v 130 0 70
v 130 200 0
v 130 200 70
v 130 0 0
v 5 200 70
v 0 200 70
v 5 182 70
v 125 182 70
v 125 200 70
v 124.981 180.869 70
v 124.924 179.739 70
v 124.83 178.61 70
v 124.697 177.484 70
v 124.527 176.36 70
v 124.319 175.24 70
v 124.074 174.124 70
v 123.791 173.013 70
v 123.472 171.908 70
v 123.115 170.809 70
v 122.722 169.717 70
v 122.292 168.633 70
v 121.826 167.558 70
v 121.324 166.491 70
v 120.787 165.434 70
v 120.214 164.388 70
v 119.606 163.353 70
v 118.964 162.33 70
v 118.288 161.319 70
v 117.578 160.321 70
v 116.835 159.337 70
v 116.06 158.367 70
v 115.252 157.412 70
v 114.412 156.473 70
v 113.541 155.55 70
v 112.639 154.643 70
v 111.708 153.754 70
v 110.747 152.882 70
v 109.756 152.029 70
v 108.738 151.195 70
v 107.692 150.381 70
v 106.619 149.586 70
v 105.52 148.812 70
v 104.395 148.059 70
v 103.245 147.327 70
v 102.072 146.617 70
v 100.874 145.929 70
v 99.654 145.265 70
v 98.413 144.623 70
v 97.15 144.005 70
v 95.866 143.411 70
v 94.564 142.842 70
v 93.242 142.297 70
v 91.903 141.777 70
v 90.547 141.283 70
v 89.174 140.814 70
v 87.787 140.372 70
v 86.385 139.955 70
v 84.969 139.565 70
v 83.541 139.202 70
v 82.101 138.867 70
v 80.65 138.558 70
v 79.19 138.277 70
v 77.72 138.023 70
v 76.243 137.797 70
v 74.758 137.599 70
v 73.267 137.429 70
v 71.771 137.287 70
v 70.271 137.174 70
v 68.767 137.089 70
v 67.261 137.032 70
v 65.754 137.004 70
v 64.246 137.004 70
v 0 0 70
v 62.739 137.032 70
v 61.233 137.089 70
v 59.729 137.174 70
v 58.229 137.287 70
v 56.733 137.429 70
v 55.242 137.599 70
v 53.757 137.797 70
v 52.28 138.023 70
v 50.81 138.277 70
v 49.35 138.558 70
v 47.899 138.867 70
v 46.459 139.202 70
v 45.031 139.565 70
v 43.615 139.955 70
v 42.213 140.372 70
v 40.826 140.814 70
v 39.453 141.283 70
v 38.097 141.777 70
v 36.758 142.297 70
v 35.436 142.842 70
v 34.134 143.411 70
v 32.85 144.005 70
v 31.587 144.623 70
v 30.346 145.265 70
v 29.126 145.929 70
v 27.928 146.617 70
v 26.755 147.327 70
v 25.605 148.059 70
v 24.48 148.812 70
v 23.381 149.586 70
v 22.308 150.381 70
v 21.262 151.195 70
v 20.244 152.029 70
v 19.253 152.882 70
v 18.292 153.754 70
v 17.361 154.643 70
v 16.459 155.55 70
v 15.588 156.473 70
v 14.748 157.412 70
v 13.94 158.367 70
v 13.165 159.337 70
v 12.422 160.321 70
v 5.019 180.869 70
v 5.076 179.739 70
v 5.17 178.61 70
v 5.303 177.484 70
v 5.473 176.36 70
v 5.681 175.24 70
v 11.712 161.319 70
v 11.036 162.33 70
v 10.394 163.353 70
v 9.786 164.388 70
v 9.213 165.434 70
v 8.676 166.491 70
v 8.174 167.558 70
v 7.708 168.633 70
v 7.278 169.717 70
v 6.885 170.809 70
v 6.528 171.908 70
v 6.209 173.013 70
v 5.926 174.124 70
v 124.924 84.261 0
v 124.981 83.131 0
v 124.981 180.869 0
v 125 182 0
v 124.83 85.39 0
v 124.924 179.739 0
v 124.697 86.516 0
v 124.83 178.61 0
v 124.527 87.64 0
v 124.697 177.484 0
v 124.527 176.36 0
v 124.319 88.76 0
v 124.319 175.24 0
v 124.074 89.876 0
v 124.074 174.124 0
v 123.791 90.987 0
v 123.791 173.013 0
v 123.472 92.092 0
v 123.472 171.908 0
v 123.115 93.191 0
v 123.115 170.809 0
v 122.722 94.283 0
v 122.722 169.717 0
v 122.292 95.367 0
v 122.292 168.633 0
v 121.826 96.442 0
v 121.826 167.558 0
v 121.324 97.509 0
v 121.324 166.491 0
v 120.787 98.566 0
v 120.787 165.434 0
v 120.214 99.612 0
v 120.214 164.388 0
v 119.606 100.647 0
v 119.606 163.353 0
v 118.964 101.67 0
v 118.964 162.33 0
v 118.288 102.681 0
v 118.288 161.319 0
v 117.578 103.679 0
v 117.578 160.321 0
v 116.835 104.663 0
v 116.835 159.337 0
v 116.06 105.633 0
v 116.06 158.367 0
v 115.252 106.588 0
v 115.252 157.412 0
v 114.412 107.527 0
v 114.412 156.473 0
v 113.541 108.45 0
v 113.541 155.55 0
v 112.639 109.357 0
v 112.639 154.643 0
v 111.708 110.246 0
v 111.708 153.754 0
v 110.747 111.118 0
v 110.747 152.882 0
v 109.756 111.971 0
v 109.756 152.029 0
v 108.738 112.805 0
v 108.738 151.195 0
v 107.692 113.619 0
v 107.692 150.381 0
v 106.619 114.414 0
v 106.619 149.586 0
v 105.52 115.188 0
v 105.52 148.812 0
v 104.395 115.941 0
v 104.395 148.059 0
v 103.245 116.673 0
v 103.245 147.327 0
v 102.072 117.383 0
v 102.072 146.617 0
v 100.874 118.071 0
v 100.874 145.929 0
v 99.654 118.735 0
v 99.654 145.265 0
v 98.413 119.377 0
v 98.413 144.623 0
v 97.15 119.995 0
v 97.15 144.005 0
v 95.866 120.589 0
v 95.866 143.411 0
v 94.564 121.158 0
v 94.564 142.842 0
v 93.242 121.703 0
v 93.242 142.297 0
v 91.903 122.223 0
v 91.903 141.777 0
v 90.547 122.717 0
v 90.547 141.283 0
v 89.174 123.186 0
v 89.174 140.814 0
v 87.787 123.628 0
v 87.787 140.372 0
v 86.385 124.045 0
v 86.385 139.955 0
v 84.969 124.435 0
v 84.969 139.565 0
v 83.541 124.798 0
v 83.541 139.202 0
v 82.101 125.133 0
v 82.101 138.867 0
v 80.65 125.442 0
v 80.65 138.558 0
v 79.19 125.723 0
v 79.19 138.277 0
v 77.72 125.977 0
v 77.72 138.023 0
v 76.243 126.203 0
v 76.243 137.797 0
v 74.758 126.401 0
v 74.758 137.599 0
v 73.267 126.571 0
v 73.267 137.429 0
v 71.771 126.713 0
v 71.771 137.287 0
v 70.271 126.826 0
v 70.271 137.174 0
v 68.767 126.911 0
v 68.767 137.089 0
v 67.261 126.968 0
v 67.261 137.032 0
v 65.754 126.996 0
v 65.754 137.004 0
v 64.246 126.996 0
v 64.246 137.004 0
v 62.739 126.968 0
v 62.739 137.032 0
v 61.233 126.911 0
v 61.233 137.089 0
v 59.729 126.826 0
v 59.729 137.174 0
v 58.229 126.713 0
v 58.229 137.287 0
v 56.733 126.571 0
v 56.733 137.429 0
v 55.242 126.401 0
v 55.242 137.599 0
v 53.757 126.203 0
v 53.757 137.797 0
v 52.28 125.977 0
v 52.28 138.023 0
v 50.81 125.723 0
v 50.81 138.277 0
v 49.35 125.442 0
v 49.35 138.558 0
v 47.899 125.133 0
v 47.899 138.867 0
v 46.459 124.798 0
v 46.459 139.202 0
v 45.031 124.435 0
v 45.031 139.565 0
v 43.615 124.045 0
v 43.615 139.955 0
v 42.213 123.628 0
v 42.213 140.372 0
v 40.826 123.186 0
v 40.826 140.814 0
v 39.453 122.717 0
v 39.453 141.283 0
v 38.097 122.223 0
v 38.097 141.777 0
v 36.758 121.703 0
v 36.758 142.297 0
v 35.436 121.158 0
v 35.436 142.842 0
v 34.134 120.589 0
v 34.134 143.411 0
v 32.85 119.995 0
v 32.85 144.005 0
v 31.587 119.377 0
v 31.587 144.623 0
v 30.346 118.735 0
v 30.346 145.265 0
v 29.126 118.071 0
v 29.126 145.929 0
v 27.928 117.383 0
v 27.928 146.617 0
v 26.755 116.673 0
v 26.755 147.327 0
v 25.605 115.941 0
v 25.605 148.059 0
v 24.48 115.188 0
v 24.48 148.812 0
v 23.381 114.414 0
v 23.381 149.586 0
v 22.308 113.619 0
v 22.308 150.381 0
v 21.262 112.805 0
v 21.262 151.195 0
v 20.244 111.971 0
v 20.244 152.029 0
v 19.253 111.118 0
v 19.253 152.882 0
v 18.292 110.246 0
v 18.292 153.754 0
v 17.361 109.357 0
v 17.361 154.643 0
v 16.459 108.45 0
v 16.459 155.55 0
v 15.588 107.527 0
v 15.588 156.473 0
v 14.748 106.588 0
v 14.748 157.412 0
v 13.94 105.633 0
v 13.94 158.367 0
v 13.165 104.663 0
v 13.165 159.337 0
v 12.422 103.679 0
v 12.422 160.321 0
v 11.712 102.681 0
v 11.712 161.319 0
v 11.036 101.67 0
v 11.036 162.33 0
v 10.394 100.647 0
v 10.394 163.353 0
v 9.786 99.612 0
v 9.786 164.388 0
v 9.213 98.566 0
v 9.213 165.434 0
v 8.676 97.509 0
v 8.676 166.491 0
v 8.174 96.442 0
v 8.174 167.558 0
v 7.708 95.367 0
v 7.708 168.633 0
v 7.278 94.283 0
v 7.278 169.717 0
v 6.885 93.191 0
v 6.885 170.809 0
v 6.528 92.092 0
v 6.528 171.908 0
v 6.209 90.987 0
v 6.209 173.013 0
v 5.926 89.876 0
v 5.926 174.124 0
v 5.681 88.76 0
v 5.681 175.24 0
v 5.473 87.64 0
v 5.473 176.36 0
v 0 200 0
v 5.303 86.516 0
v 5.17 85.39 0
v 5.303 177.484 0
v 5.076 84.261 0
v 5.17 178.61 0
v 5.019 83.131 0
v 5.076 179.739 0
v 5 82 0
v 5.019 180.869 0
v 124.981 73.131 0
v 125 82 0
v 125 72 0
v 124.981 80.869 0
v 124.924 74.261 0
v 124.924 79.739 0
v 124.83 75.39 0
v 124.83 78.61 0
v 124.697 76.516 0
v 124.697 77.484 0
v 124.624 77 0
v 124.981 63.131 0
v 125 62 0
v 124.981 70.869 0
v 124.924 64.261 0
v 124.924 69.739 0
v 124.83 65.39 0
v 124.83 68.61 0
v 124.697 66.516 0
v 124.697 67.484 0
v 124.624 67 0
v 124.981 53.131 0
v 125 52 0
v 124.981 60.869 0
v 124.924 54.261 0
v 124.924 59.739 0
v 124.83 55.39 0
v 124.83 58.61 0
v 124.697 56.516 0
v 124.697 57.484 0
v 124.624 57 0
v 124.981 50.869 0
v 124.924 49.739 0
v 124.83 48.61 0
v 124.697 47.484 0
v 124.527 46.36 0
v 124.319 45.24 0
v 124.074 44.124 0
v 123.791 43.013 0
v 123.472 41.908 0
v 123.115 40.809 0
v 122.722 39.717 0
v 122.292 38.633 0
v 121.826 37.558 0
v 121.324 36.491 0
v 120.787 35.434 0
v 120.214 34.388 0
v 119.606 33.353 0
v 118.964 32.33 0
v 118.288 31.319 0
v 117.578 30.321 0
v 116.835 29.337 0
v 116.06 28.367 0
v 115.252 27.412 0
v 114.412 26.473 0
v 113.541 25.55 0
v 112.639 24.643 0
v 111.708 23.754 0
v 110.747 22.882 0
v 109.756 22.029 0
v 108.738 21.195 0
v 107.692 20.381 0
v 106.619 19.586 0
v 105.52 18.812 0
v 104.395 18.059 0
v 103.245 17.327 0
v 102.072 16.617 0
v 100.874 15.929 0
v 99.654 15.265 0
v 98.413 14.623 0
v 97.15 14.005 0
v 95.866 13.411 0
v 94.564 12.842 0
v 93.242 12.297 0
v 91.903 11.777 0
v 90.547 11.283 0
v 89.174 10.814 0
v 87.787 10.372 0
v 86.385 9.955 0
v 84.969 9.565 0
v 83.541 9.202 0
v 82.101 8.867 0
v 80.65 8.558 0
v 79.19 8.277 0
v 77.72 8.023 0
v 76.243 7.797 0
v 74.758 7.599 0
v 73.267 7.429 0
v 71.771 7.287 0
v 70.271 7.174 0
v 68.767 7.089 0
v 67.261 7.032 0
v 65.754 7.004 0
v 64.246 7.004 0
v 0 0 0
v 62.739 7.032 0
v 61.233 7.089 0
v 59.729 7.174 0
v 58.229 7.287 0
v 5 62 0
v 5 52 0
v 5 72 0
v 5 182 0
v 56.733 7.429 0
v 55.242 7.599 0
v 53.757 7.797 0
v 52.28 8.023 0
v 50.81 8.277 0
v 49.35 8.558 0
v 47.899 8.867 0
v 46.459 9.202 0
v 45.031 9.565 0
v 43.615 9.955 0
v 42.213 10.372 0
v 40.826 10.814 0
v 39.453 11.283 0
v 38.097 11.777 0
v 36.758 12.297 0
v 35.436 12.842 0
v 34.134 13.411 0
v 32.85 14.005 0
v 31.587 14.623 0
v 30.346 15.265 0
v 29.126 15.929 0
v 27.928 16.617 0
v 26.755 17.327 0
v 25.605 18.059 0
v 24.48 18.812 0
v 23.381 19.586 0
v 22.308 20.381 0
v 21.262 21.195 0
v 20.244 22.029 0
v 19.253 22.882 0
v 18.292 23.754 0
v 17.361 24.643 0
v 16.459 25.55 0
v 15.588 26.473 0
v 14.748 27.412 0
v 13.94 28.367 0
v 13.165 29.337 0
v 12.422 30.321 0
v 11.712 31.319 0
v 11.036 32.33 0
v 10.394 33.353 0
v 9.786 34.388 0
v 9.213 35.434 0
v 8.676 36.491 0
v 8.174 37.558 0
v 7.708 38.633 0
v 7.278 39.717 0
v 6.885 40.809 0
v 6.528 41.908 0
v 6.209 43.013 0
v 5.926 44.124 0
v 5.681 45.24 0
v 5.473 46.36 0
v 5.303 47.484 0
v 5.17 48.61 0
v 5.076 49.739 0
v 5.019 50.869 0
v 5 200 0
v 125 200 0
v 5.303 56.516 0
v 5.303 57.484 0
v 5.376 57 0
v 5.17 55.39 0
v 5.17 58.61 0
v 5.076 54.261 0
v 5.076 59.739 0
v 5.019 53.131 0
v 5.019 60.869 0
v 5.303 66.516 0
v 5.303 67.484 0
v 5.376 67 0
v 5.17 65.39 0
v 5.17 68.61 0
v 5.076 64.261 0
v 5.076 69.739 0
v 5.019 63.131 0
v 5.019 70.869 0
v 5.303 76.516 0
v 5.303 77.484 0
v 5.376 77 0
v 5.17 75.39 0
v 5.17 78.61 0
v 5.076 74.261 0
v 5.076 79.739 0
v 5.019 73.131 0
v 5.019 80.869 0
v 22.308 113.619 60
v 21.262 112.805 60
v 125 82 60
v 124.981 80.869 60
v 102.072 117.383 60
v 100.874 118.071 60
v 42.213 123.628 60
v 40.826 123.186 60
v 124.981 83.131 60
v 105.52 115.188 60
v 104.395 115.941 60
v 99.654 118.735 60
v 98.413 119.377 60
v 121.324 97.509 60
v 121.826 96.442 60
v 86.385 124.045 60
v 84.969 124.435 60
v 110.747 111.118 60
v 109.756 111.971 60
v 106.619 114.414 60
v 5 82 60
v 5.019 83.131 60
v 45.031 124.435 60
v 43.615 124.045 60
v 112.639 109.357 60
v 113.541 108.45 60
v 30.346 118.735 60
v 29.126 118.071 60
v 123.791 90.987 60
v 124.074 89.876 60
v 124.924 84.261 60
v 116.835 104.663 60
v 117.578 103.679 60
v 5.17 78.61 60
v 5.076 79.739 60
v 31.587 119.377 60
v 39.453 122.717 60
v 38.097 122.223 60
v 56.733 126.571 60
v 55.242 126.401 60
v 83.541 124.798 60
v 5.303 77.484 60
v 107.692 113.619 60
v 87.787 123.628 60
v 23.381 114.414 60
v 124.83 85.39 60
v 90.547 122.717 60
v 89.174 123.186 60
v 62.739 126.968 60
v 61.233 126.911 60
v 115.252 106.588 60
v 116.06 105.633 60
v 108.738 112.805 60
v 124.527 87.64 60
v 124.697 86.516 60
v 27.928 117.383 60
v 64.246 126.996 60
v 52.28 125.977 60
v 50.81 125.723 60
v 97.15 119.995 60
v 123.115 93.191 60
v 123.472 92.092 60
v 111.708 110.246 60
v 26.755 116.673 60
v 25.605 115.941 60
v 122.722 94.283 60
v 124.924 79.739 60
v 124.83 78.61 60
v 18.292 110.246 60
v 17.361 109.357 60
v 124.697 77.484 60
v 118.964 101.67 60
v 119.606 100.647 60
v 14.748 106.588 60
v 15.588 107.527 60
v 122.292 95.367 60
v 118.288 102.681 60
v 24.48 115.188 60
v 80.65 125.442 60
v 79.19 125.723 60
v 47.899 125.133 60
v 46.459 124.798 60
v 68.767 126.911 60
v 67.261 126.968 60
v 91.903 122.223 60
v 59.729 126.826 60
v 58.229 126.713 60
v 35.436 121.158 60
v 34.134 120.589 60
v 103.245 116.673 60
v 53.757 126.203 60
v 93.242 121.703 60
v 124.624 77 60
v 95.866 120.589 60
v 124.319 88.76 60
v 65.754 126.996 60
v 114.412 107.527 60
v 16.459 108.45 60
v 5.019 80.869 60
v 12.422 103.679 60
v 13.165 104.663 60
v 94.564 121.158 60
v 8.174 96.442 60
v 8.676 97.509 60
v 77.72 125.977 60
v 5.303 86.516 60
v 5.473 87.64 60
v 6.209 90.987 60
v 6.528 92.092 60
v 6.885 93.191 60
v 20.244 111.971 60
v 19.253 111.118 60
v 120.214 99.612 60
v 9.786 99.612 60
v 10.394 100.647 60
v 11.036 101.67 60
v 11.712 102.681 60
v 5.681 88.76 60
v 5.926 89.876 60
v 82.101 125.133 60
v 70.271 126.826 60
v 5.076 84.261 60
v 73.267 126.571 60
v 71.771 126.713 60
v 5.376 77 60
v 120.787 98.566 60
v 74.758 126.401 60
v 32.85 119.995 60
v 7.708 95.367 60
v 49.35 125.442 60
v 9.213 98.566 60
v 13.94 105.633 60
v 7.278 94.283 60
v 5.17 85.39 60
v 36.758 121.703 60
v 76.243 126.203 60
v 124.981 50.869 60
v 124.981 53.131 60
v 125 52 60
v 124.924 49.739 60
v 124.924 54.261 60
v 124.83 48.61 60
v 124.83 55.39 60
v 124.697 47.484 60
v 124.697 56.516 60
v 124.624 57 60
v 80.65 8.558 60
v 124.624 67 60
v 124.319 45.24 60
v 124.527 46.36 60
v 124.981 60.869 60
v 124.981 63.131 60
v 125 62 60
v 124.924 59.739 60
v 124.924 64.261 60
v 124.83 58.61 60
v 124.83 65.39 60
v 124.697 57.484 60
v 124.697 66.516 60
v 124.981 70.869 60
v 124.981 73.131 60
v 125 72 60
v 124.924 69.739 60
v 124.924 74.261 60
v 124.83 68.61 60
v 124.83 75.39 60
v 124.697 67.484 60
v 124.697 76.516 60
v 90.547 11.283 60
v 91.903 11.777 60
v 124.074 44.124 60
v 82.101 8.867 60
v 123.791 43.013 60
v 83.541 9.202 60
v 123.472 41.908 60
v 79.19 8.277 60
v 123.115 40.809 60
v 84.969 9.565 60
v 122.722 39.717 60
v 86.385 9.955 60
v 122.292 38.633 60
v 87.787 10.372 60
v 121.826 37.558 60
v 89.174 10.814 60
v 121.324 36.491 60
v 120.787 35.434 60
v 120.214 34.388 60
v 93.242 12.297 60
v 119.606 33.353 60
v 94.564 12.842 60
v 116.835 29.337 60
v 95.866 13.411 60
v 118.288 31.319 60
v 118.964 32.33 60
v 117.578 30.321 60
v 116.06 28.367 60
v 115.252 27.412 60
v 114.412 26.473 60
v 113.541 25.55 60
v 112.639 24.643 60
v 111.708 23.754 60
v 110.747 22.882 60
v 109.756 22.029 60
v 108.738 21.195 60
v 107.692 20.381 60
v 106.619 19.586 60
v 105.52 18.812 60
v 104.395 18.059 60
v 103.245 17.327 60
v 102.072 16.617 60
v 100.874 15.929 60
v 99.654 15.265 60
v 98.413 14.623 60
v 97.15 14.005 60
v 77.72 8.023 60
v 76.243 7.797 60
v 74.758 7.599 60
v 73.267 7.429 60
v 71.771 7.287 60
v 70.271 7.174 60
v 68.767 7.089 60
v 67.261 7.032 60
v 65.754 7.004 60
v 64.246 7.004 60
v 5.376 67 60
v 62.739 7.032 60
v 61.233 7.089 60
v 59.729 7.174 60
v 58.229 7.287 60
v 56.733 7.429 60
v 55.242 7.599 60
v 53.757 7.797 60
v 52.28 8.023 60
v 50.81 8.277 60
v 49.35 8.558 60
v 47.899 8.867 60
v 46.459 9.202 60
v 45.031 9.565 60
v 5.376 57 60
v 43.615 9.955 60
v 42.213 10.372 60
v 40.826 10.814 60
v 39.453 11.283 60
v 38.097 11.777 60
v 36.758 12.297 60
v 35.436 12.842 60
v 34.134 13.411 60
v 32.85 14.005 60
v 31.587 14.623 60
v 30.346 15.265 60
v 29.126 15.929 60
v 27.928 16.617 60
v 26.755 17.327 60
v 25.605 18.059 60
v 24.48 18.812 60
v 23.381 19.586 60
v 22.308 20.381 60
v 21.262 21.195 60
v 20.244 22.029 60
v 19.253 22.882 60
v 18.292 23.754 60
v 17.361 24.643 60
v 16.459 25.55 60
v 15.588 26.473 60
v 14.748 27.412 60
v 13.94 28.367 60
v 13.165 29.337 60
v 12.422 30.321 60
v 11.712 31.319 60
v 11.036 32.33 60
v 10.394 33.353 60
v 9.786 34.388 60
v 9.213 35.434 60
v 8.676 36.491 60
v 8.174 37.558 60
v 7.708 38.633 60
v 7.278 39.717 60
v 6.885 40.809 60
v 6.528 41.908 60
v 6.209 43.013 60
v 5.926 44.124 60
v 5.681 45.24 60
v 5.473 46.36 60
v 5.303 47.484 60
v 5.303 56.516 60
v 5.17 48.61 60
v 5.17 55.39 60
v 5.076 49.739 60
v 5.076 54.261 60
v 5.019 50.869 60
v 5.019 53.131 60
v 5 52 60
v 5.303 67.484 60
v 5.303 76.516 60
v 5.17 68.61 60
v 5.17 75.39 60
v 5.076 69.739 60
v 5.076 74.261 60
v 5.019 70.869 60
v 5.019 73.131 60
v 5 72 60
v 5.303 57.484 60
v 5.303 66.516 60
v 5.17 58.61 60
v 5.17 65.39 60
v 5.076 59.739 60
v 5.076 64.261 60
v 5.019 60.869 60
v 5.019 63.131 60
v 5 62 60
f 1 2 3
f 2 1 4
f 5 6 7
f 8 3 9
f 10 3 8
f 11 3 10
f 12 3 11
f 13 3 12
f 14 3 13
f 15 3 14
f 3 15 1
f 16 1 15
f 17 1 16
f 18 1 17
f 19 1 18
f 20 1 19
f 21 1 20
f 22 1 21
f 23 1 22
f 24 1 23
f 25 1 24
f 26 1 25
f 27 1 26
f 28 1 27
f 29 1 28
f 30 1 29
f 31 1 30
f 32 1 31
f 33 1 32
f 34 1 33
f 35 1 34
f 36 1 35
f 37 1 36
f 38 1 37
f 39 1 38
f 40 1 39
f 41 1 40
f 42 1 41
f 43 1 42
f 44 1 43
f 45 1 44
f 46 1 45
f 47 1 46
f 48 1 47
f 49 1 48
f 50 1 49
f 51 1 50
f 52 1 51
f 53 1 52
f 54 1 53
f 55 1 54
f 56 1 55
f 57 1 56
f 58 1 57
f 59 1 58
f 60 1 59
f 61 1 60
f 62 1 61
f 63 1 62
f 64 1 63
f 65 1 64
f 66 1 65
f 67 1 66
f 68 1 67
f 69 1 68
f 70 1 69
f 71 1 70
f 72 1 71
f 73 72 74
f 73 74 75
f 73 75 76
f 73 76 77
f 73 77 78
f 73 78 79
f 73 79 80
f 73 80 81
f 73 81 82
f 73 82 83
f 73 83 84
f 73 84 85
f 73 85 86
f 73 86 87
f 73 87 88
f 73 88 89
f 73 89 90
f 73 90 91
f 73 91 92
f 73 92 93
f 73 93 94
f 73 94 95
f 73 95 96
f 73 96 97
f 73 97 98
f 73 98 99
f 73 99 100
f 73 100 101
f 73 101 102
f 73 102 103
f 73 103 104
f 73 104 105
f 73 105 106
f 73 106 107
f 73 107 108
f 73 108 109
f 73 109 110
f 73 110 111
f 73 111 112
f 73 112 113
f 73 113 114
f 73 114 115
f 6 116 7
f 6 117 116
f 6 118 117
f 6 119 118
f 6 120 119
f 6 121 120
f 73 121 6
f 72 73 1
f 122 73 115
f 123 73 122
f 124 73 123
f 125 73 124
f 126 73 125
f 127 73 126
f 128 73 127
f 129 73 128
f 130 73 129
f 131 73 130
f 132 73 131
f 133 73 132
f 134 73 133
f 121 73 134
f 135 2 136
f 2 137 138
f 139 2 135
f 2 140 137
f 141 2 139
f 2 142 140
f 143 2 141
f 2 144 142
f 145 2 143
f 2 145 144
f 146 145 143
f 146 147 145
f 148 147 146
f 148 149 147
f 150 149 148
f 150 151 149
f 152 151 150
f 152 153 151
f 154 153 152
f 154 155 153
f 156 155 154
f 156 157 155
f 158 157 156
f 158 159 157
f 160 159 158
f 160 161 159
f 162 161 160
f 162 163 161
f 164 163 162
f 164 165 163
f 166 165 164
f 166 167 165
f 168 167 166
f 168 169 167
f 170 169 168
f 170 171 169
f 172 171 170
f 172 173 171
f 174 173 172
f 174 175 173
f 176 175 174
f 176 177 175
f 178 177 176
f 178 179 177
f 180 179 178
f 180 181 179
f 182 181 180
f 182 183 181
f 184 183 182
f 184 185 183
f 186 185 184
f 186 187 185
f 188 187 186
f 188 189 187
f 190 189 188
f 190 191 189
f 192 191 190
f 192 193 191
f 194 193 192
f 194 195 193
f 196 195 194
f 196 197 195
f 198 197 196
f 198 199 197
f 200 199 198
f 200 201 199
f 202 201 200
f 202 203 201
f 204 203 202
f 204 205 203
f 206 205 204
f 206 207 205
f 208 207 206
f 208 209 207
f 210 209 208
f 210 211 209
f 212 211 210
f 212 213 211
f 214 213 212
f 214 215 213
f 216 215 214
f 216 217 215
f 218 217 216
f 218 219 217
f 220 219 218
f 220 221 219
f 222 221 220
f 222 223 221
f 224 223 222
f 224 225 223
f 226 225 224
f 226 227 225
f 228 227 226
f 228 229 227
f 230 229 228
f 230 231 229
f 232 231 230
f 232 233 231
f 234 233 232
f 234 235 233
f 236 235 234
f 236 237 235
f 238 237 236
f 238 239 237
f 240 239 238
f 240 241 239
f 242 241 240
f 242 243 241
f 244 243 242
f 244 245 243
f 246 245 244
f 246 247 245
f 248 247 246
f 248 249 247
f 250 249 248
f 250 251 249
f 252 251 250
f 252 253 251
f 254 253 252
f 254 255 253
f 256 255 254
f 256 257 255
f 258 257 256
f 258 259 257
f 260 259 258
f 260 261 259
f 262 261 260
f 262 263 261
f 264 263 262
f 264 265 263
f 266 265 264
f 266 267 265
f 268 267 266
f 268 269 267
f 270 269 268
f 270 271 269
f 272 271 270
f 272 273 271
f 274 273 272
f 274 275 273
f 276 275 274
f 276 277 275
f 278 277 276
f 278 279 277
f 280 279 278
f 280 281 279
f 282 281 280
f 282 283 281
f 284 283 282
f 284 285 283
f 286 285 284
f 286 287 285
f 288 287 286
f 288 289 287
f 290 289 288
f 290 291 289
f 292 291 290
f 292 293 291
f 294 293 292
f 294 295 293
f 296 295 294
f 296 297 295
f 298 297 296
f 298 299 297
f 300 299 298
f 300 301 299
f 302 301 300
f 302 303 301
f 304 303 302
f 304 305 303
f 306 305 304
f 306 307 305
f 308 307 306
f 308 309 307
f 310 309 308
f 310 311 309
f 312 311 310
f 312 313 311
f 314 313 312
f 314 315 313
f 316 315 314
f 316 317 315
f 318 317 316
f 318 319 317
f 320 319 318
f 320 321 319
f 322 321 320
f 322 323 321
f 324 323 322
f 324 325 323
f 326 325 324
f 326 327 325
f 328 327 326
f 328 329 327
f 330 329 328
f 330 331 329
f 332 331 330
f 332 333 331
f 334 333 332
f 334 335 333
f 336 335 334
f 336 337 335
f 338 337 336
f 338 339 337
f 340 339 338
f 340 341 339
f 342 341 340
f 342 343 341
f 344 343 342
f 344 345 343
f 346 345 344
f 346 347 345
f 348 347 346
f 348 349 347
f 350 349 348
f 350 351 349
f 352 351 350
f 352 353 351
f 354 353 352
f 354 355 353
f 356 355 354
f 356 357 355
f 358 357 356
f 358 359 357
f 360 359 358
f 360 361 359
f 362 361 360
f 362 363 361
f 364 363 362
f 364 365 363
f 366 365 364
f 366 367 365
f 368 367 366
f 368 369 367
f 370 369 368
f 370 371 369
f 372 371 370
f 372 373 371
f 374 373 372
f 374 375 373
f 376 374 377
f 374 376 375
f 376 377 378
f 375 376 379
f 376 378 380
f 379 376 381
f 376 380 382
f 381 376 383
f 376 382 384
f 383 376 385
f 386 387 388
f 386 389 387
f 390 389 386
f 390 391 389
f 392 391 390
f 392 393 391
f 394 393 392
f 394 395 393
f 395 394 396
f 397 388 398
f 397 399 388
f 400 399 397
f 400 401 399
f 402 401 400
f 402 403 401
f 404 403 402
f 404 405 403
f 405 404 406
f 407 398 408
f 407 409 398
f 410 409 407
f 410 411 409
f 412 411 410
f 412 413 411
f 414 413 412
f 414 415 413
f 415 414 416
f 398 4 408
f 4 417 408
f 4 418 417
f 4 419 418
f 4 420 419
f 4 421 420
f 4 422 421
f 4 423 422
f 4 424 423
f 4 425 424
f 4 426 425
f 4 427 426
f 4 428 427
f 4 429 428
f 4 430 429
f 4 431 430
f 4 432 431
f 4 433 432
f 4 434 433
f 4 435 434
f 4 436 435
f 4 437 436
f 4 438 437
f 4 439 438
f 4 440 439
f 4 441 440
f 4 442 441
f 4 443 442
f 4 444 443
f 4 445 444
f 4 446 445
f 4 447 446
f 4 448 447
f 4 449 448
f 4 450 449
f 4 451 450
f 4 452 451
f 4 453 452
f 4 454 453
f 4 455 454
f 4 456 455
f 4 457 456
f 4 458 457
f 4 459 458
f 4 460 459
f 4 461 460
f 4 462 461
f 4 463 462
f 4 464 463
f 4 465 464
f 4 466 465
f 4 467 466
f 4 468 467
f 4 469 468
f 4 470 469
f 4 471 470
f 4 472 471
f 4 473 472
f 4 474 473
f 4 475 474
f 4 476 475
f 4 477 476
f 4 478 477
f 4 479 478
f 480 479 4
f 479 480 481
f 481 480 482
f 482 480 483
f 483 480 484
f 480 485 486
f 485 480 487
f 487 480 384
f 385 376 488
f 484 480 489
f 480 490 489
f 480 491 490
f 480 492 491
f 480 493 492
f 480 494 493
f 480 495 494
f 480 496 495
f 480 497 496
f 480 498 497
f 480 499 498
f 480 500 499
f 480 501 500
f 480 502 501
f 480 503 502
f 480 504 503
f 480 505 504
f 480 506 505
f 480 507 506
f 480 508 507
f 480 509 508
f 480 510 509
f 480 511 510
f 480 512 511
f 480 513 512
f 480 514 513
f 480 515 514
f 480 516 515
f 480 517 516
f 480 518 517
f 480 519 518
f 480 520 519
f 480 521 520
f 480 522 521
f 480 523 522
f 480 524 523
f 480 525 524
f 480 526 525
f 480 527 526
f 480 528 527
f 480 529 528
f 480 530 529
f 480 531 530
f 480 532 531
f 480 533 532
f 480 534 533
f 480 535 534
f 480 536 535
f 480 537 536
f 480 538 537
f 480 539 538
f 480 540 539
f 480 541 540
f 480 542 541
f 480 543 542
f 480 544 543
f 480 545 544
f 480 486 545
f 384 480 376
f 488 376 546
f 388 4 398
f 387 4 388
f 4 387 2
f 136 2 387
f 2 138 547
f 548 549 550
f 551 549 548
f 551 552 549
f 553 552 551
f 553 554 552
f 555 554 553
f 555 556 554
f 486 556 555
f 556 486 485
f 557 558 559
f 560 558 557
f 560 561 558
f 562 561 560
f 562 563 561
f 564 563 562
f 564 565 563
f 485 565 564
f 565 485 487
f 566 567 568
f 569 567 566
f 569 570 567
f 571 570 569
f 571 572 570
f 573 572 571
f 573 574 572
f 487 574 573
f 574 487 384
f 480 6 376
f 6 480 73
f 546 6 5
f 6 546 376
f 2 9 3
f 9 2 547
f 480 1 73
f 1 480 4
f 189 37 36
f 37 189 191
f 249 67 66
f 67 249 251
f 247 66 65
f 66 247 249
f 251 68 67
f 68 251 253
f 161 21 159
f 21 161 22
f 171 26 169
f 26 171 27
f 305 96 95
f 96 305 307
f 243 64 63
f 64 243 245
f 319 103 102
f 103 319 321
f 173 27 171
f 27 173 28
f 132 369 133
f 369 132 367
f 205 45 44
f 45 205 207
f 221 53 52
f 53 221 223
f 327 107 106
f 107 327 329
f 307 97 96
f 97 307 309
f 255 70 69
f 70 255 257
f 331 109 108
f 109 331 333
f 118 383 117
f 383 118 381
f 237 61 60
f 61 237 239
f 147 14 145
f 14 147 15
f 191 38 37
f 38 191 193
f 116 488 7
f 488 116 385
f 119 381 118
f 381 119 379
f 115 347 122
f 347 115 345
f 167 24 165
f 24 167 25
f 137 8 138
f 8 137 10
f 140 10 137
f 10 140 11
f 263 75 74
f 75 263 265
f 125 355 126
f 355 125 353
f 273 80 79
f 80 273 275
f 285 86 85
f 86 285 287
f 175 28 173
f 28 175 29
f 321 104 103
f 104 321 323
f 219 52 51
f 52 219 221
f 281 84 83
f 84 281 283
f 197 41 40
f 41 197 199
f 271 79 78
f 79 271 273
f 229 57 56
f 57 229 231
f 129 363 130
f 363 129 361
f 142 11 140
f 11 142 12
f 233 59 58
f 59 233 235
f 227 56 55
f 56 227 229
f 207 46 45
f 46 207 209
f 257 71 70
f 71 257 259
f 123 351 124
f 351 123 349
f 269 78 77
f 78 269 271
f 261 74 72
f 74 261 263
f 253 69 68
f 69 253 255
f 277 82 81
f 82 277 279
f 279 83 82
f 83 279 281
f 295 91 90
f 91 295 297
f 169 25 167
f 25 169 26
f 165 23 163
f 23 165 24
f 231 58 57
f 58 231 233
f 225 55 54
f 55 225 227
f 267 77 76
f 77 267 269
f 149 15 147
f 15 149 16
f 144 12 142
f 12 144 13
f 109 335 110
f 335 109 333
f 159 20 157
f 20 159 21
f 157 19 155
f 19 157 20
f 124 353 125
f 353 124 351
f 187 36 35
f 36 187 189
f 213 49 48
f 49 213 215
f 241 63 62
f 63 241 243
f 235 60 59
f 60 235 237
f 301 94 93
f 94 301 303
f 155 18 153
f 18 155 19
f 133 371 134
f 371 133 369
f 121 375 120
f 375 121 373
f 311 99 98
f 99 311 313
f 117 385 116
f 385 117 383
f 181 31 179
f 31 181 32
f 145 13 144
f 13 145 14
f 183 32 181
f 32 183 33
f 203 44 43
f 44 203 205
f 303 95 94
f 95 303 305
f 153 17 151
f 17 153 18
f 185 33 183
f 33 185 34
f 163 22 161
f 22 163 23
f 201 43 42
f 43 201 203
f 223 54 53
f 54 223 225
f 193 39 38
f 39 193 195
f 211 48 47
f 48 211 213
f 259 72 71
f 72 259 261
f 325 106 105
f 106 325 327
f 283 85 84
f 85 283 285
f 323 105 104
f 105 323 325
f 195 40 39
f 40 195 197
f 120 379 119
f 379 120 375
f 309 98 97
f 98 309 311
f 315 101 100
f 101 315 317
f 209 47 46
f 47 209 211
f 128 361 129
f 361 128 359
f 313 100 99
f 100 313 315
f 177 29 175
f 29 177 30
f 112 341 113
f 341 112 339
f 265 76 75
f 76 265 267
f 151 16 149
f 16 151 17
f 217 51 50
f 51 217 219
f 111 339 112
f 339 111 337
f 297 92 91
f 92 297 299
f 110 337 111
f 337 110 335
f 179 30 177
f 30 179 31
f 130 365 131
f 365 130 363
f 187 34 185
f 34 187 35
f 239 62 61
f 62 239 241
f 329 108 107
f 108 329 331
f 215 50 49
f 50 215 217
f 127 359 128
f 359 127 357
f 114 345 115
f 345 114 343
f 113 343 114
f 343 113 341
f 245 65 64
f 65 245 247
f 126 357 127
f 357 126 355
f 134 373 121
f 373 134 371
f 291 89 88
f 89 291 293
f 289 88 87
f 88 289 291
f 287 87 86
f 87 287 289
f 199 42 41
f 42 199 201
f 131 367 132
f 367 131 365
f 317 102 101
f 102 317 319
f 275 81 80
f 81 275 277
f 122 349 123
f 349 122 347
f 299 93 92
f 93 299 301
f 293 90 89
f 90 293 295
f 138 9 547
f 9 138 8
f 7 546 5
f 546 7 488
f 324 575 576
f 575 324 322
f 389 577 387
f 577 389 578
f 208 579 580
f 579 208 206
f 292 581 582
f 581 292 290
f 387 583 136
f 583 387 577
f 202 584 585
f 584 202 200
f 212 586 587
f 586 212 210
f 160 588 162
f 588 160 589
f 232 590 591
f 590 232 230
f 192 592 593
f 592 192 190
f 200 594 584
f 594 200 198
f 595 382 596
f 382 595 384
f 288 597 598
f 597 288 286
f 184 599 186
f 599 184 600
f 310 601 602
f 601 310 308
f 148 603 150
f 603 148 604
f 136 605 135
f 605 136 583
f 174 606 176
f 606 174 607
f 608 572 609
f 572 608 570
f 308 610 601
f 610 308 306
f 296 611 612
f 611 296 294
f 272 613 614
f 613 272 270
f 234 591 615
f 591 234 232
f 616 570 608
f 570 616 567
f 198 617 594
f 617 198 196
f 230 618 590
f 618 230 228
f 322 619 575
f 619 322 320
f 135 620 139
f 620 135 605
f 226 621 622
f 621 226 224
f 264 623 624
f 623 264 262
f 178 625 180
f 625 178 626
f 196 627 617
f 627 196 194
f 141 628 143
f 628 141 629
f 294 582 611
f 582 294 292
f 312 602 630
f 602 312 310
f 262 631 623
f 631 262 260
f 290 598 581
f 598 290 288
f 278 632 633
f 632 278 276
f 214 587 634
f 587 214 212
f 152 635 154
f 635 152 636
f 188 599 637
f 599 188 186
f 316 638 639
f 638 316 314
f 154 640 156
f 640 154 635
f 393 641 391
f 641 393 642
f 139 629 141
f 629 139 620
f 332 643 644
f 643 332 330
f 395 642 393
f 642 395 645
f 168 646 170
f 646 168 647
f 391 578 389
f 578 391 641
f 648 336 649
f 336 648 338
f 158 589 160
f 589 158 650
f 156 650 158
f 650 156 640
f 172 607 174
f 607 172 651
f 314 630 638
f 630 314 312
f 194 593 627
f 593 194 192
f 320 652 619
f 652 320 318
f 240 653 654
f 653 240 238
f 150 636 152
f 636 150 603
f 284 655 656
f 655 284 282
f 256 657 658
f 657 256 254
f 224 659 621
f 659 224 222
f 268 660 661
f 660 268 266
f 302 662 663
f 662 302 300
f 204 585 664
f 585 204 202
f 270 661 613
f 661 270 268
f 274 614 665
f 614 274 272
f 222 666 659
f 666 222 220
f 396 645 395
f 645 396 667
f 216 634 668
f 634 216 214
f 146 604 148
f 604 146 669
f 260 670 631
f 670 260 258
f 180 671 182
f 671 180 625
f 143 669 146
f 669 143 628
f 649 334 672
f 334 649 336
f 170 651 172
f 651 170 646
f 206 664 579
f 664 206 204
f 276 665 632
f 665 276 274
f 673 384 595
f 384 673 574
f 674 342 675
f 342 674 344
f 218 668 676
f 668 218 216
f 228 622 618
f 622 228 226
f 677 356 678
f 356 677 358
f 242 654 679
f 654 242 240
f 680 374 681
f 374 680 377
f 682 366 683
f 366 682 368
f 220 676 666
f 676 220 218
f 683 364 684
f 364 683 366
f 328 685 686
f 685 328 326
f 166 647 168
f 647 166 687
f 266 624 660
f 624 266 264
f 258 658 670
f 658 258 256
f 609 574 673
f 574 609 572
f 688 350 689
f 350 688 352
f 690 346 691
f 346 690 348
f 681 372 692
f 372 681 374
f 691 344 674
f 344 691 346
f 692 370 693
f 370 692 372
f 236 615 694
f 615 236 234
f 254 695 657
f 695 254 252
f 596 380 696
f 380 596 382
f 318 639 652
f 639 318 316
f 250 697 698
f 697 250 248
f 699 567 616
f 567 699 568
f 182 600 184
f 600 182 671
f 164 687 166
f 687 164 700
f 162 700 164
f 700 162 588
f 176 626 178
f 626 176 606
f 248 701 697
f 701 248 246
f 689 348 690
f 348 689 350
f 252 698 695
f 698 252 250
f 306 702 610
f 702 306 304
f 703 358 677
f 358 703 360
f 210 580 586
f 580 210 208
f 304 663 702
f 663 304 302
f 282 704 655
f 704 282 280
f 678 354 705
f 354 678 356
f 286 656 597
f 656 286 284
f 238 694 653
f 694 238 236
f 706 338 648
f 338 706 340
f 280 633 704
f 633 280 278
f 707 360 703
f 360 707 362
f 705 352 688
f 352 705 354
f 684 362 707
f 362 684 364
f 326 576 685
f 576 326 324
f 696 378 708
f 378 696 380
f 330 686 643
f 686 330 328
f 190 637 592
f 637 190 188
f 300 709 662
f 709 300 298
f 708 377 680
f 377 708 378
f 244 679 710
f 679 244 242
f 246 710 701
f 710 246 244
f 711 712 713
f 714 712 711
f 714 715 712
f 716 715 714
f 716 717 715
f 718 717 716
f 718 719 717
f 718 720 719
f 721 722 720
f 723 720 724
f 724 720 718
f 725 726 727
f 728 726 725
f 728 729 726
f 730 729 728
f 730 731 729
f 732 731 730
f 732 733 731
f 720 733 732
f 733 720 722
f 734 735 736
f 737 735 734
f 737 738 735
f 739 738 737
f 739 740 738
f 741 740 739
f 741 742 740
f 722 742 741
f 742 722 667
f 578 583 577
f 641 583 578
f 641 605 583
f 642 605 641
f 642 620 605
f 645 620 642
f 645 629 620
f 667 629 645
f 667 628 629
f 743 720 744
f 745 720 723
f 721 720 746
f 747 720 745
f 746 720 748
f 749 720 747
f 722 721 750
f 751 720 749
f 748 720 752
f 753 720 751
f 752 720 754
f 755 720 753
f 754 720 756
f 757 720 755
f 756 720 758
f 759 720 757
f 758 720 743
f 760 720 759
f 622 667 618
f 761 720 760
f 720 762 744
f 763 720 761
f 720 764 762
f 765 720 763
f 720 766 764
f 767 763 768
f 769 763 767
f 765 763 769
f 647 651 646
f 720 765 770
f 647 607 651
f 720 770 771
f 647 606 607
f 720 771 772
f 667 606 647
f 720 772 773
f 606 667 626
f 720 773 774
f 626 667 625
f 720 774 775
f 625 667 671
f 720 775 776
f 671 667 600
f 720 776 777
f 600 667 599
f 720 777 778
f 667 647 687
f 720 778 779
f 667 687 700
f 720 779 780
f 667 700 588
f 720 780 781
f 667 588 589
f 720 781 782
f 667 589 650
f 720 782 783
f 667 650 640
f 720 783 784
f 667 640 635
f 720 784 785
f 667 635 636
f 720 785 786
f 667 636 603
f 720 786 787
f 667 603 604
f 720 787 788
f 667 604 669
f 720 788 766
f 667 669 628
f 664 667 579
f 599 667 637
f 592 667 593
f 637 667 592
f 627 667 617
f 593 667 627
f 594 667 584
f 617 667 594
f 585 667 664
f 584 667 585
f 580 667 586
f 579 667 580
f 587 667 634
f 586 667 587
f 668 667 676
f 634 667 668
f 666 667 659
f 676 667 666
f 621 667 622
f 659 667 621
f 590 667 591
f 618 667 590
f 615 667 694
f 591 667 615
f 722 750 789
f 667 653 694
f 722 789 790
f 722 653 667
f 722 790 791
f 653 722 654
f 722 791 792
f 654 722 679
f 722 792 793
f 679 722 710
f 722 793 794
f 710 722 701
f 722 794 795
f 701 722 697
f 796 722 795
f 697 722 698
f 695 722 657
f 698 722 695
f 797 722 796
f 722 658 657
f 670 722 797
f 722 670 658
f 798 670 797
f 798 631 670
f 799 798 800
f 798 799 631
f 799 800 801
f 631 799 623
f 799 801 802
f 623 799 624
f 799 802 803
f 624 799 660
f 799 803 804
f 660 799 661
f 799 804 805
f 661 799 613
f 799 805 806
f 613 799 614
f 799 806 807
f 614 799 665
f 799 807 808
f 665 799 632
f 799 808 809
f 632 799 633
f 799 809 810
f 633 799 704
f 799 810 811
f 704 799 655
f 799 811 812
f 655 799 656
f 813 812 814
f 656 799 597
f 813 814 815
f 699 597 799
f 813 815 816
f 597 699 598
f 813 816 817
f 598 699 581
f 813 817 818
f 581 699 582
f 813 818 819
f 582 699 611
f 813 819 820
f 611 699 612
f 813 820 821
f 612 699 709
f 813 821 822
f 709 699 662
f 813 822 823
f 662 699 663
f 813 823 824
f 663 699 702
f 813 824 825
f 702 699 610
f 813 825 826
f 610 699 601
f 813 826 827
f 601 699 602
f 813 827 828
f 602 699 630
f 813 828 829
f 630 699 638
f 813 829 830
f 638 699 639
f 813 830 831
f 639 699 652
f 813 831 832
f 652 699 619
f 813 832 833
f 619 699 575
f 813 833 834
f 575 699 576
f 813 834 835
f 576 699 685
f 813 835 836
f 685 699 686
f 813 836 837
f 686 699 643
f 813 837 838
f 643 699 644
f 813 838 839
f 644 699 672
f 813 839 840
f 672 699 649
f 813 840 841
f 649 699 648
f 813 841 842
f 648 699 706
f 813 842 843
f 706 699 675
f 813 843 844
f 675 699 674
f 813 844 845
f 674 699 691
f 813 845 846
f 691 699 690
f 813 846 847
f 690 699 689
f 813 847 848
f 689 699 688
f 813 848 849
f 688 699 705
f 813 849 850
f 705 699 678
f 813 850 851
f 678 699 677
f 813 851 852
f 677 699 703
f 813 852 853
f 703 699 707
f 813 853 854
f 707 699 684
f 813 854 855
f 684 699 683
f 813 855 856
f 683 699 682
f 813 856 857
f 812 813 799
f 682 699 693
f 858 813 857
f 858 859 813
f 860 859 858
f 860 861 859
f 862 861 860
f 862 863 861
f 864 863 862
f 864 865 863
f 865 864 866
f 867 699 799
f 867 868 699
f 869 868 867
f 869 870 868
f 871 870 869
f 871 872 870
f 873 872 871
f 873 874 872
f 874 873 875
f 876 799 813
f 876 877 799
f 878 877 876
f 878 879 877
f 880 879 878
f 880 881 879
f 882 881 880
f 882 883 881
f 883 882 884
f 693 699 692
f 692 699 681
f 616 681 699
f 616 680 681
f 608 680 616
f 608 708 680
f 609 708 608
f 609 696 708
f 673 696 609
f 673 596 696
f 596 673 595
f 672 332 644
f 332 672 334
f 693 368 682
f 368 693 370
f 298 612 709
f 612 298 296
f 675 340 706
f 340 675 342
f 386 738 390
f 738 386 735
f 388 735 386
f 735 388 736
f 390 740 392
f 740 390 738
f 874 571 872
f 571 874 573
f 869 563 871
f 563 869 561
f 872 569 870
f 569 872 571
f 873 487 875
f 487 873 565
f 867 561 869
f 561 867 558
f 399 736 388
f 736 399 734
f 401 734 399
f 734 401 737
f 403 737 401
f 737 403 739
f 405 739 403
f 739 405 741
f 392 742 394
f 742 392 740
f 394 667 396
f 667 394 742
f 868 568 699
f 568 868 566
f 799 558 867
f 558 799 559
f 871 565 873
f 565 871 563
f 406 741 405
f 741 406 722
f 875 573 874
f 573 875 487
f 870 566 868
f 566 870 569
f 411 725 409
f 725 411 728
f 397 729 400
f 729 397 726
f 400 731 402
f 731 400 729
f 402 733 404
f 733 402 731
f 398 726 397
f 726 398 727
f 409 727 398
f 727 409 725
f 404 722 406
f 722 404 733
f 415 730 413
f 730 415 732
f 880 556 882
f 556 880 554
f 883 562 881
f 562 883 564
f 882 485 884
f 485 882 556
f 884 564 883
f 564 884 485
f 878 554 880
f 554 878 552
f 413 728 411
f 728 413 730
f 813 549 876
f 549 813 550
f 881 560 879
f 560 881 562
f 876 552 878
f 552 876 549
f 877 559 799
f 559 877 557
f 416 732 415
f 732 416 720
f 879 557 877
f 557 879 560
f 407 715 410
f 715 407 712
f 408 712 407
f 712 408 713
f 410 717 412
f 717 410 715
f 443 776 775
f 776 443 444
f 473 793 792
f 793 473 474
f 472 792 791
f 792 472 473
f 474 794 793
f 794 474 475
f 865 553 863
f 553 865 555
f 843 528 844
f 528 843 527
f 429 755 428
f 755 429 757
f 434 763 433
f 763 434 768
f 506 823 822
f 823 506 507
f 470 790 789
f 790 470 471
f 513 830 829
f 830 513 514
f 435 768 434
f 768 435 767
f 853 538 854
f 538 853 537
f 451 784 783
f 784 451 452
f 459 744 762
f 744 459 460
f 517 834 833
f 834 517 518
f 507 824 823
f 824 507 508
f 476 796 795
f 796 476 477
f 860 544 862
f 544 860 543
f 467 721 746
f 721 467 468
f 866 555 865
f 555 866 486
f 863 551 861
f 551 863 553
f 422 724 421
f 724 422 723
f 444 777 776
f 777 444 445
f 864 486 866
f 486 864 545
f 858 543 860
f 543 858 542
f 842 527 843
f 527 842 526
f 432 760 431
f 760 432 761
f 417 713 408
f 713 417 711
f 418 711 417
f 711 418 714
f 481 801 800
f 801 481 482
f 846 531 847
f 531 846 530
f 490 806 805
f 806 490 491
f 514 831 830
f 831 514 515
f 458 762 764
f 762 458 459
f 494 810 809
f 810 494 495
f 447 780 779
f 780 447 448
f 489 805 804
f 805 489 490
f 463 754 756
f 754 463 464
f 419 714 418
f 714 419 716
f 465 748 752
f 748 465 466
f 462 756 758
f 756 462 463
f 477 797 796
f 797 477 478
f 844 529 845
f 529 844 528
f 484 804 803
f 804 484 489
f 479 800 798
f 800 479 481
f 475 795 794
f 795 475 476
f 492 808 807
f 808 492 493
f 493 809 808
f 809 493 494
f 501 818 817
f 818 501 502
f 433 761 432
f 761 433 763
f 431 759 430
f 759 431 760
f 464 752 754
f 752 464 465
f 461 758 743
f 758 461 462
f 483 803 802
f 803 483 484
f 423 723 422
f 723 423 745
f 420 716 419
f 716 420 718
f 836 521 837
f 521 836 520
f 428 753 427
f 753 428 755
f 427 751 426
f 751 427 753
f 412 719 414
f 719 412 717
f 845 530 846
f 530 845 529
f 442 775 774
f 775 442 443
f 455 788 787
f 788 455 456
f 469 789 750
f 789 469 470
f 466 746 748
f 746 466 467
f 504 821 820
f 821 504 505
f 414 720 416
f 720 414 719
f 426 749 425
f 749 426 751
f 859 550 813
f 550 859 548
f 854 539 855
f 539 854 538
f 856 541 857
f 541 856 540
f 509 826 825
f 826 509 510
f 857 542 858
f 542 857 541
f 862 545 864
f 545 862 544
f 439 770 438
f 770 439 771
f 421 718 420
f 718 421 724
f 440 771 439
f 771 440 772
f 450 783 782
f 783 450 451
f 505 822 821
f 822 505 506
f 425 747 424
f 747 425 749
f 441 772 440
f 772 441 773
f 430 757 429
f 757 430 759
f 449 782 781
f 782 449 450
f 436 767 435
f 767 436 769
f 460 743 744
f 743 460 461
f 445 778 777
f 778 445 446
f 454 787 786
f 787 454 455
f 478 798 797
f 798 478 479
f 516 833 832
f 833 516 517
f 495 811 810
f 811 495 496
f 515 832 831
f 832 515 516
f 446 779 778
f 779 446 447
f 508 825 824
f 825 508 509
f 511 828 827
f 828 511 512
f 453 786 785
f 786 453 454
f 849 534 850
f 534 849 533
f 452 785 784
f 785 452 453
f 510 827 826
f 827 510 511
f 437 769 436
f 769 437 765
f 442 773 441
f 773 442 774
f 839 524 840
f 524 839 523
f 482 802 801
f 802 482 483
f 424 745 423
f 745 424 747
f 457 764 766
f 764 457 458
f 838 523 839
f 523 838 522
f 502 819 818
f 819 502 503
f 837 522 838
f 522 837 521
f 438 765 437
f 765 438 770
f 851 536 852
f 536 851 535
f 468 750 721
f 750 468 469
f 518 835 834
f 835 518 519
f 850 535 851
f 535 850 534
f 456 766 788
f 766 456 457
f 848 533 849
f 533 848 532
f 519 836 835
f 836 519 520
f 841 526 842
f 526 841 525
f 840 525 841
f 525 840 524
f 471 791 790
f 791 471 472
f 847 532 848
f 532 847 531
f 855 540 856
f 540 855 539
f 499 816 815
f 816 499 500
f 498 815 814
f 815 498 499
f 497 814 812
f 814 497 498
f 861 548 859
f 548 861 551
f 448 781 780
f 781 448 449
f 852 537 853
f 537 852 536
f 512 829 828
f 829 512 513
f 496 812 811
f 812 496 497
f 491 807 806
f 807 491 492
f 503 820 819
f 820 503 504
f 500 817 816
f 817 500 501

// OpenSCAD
$fn=250;


difference()
{
    translate([0,0,0]) cube([130,200,70]);
    translate([65,182,-5]) scale([1,0.75,1]) cylinder(d=120,h=90);
    translate([5,182,-5]) cube([120,50,80]);
    
    translate([65,82,-5]) scale([1,0.75,1]) cylinder(d=120,h=65);
    translate([65,72,-5]) scale([1,0.75,1]) cylinder(d=120,h=65);
    translate([65,62,-5]) scale([1,0.75,1]) cylinder(d=120,h=65);
    translate([65,52,-5]) scale([1,0.75,1]) cylinder(d=120,h=65);
}

// translate([-10,135,-5]) cube([140,0.1,80]);
